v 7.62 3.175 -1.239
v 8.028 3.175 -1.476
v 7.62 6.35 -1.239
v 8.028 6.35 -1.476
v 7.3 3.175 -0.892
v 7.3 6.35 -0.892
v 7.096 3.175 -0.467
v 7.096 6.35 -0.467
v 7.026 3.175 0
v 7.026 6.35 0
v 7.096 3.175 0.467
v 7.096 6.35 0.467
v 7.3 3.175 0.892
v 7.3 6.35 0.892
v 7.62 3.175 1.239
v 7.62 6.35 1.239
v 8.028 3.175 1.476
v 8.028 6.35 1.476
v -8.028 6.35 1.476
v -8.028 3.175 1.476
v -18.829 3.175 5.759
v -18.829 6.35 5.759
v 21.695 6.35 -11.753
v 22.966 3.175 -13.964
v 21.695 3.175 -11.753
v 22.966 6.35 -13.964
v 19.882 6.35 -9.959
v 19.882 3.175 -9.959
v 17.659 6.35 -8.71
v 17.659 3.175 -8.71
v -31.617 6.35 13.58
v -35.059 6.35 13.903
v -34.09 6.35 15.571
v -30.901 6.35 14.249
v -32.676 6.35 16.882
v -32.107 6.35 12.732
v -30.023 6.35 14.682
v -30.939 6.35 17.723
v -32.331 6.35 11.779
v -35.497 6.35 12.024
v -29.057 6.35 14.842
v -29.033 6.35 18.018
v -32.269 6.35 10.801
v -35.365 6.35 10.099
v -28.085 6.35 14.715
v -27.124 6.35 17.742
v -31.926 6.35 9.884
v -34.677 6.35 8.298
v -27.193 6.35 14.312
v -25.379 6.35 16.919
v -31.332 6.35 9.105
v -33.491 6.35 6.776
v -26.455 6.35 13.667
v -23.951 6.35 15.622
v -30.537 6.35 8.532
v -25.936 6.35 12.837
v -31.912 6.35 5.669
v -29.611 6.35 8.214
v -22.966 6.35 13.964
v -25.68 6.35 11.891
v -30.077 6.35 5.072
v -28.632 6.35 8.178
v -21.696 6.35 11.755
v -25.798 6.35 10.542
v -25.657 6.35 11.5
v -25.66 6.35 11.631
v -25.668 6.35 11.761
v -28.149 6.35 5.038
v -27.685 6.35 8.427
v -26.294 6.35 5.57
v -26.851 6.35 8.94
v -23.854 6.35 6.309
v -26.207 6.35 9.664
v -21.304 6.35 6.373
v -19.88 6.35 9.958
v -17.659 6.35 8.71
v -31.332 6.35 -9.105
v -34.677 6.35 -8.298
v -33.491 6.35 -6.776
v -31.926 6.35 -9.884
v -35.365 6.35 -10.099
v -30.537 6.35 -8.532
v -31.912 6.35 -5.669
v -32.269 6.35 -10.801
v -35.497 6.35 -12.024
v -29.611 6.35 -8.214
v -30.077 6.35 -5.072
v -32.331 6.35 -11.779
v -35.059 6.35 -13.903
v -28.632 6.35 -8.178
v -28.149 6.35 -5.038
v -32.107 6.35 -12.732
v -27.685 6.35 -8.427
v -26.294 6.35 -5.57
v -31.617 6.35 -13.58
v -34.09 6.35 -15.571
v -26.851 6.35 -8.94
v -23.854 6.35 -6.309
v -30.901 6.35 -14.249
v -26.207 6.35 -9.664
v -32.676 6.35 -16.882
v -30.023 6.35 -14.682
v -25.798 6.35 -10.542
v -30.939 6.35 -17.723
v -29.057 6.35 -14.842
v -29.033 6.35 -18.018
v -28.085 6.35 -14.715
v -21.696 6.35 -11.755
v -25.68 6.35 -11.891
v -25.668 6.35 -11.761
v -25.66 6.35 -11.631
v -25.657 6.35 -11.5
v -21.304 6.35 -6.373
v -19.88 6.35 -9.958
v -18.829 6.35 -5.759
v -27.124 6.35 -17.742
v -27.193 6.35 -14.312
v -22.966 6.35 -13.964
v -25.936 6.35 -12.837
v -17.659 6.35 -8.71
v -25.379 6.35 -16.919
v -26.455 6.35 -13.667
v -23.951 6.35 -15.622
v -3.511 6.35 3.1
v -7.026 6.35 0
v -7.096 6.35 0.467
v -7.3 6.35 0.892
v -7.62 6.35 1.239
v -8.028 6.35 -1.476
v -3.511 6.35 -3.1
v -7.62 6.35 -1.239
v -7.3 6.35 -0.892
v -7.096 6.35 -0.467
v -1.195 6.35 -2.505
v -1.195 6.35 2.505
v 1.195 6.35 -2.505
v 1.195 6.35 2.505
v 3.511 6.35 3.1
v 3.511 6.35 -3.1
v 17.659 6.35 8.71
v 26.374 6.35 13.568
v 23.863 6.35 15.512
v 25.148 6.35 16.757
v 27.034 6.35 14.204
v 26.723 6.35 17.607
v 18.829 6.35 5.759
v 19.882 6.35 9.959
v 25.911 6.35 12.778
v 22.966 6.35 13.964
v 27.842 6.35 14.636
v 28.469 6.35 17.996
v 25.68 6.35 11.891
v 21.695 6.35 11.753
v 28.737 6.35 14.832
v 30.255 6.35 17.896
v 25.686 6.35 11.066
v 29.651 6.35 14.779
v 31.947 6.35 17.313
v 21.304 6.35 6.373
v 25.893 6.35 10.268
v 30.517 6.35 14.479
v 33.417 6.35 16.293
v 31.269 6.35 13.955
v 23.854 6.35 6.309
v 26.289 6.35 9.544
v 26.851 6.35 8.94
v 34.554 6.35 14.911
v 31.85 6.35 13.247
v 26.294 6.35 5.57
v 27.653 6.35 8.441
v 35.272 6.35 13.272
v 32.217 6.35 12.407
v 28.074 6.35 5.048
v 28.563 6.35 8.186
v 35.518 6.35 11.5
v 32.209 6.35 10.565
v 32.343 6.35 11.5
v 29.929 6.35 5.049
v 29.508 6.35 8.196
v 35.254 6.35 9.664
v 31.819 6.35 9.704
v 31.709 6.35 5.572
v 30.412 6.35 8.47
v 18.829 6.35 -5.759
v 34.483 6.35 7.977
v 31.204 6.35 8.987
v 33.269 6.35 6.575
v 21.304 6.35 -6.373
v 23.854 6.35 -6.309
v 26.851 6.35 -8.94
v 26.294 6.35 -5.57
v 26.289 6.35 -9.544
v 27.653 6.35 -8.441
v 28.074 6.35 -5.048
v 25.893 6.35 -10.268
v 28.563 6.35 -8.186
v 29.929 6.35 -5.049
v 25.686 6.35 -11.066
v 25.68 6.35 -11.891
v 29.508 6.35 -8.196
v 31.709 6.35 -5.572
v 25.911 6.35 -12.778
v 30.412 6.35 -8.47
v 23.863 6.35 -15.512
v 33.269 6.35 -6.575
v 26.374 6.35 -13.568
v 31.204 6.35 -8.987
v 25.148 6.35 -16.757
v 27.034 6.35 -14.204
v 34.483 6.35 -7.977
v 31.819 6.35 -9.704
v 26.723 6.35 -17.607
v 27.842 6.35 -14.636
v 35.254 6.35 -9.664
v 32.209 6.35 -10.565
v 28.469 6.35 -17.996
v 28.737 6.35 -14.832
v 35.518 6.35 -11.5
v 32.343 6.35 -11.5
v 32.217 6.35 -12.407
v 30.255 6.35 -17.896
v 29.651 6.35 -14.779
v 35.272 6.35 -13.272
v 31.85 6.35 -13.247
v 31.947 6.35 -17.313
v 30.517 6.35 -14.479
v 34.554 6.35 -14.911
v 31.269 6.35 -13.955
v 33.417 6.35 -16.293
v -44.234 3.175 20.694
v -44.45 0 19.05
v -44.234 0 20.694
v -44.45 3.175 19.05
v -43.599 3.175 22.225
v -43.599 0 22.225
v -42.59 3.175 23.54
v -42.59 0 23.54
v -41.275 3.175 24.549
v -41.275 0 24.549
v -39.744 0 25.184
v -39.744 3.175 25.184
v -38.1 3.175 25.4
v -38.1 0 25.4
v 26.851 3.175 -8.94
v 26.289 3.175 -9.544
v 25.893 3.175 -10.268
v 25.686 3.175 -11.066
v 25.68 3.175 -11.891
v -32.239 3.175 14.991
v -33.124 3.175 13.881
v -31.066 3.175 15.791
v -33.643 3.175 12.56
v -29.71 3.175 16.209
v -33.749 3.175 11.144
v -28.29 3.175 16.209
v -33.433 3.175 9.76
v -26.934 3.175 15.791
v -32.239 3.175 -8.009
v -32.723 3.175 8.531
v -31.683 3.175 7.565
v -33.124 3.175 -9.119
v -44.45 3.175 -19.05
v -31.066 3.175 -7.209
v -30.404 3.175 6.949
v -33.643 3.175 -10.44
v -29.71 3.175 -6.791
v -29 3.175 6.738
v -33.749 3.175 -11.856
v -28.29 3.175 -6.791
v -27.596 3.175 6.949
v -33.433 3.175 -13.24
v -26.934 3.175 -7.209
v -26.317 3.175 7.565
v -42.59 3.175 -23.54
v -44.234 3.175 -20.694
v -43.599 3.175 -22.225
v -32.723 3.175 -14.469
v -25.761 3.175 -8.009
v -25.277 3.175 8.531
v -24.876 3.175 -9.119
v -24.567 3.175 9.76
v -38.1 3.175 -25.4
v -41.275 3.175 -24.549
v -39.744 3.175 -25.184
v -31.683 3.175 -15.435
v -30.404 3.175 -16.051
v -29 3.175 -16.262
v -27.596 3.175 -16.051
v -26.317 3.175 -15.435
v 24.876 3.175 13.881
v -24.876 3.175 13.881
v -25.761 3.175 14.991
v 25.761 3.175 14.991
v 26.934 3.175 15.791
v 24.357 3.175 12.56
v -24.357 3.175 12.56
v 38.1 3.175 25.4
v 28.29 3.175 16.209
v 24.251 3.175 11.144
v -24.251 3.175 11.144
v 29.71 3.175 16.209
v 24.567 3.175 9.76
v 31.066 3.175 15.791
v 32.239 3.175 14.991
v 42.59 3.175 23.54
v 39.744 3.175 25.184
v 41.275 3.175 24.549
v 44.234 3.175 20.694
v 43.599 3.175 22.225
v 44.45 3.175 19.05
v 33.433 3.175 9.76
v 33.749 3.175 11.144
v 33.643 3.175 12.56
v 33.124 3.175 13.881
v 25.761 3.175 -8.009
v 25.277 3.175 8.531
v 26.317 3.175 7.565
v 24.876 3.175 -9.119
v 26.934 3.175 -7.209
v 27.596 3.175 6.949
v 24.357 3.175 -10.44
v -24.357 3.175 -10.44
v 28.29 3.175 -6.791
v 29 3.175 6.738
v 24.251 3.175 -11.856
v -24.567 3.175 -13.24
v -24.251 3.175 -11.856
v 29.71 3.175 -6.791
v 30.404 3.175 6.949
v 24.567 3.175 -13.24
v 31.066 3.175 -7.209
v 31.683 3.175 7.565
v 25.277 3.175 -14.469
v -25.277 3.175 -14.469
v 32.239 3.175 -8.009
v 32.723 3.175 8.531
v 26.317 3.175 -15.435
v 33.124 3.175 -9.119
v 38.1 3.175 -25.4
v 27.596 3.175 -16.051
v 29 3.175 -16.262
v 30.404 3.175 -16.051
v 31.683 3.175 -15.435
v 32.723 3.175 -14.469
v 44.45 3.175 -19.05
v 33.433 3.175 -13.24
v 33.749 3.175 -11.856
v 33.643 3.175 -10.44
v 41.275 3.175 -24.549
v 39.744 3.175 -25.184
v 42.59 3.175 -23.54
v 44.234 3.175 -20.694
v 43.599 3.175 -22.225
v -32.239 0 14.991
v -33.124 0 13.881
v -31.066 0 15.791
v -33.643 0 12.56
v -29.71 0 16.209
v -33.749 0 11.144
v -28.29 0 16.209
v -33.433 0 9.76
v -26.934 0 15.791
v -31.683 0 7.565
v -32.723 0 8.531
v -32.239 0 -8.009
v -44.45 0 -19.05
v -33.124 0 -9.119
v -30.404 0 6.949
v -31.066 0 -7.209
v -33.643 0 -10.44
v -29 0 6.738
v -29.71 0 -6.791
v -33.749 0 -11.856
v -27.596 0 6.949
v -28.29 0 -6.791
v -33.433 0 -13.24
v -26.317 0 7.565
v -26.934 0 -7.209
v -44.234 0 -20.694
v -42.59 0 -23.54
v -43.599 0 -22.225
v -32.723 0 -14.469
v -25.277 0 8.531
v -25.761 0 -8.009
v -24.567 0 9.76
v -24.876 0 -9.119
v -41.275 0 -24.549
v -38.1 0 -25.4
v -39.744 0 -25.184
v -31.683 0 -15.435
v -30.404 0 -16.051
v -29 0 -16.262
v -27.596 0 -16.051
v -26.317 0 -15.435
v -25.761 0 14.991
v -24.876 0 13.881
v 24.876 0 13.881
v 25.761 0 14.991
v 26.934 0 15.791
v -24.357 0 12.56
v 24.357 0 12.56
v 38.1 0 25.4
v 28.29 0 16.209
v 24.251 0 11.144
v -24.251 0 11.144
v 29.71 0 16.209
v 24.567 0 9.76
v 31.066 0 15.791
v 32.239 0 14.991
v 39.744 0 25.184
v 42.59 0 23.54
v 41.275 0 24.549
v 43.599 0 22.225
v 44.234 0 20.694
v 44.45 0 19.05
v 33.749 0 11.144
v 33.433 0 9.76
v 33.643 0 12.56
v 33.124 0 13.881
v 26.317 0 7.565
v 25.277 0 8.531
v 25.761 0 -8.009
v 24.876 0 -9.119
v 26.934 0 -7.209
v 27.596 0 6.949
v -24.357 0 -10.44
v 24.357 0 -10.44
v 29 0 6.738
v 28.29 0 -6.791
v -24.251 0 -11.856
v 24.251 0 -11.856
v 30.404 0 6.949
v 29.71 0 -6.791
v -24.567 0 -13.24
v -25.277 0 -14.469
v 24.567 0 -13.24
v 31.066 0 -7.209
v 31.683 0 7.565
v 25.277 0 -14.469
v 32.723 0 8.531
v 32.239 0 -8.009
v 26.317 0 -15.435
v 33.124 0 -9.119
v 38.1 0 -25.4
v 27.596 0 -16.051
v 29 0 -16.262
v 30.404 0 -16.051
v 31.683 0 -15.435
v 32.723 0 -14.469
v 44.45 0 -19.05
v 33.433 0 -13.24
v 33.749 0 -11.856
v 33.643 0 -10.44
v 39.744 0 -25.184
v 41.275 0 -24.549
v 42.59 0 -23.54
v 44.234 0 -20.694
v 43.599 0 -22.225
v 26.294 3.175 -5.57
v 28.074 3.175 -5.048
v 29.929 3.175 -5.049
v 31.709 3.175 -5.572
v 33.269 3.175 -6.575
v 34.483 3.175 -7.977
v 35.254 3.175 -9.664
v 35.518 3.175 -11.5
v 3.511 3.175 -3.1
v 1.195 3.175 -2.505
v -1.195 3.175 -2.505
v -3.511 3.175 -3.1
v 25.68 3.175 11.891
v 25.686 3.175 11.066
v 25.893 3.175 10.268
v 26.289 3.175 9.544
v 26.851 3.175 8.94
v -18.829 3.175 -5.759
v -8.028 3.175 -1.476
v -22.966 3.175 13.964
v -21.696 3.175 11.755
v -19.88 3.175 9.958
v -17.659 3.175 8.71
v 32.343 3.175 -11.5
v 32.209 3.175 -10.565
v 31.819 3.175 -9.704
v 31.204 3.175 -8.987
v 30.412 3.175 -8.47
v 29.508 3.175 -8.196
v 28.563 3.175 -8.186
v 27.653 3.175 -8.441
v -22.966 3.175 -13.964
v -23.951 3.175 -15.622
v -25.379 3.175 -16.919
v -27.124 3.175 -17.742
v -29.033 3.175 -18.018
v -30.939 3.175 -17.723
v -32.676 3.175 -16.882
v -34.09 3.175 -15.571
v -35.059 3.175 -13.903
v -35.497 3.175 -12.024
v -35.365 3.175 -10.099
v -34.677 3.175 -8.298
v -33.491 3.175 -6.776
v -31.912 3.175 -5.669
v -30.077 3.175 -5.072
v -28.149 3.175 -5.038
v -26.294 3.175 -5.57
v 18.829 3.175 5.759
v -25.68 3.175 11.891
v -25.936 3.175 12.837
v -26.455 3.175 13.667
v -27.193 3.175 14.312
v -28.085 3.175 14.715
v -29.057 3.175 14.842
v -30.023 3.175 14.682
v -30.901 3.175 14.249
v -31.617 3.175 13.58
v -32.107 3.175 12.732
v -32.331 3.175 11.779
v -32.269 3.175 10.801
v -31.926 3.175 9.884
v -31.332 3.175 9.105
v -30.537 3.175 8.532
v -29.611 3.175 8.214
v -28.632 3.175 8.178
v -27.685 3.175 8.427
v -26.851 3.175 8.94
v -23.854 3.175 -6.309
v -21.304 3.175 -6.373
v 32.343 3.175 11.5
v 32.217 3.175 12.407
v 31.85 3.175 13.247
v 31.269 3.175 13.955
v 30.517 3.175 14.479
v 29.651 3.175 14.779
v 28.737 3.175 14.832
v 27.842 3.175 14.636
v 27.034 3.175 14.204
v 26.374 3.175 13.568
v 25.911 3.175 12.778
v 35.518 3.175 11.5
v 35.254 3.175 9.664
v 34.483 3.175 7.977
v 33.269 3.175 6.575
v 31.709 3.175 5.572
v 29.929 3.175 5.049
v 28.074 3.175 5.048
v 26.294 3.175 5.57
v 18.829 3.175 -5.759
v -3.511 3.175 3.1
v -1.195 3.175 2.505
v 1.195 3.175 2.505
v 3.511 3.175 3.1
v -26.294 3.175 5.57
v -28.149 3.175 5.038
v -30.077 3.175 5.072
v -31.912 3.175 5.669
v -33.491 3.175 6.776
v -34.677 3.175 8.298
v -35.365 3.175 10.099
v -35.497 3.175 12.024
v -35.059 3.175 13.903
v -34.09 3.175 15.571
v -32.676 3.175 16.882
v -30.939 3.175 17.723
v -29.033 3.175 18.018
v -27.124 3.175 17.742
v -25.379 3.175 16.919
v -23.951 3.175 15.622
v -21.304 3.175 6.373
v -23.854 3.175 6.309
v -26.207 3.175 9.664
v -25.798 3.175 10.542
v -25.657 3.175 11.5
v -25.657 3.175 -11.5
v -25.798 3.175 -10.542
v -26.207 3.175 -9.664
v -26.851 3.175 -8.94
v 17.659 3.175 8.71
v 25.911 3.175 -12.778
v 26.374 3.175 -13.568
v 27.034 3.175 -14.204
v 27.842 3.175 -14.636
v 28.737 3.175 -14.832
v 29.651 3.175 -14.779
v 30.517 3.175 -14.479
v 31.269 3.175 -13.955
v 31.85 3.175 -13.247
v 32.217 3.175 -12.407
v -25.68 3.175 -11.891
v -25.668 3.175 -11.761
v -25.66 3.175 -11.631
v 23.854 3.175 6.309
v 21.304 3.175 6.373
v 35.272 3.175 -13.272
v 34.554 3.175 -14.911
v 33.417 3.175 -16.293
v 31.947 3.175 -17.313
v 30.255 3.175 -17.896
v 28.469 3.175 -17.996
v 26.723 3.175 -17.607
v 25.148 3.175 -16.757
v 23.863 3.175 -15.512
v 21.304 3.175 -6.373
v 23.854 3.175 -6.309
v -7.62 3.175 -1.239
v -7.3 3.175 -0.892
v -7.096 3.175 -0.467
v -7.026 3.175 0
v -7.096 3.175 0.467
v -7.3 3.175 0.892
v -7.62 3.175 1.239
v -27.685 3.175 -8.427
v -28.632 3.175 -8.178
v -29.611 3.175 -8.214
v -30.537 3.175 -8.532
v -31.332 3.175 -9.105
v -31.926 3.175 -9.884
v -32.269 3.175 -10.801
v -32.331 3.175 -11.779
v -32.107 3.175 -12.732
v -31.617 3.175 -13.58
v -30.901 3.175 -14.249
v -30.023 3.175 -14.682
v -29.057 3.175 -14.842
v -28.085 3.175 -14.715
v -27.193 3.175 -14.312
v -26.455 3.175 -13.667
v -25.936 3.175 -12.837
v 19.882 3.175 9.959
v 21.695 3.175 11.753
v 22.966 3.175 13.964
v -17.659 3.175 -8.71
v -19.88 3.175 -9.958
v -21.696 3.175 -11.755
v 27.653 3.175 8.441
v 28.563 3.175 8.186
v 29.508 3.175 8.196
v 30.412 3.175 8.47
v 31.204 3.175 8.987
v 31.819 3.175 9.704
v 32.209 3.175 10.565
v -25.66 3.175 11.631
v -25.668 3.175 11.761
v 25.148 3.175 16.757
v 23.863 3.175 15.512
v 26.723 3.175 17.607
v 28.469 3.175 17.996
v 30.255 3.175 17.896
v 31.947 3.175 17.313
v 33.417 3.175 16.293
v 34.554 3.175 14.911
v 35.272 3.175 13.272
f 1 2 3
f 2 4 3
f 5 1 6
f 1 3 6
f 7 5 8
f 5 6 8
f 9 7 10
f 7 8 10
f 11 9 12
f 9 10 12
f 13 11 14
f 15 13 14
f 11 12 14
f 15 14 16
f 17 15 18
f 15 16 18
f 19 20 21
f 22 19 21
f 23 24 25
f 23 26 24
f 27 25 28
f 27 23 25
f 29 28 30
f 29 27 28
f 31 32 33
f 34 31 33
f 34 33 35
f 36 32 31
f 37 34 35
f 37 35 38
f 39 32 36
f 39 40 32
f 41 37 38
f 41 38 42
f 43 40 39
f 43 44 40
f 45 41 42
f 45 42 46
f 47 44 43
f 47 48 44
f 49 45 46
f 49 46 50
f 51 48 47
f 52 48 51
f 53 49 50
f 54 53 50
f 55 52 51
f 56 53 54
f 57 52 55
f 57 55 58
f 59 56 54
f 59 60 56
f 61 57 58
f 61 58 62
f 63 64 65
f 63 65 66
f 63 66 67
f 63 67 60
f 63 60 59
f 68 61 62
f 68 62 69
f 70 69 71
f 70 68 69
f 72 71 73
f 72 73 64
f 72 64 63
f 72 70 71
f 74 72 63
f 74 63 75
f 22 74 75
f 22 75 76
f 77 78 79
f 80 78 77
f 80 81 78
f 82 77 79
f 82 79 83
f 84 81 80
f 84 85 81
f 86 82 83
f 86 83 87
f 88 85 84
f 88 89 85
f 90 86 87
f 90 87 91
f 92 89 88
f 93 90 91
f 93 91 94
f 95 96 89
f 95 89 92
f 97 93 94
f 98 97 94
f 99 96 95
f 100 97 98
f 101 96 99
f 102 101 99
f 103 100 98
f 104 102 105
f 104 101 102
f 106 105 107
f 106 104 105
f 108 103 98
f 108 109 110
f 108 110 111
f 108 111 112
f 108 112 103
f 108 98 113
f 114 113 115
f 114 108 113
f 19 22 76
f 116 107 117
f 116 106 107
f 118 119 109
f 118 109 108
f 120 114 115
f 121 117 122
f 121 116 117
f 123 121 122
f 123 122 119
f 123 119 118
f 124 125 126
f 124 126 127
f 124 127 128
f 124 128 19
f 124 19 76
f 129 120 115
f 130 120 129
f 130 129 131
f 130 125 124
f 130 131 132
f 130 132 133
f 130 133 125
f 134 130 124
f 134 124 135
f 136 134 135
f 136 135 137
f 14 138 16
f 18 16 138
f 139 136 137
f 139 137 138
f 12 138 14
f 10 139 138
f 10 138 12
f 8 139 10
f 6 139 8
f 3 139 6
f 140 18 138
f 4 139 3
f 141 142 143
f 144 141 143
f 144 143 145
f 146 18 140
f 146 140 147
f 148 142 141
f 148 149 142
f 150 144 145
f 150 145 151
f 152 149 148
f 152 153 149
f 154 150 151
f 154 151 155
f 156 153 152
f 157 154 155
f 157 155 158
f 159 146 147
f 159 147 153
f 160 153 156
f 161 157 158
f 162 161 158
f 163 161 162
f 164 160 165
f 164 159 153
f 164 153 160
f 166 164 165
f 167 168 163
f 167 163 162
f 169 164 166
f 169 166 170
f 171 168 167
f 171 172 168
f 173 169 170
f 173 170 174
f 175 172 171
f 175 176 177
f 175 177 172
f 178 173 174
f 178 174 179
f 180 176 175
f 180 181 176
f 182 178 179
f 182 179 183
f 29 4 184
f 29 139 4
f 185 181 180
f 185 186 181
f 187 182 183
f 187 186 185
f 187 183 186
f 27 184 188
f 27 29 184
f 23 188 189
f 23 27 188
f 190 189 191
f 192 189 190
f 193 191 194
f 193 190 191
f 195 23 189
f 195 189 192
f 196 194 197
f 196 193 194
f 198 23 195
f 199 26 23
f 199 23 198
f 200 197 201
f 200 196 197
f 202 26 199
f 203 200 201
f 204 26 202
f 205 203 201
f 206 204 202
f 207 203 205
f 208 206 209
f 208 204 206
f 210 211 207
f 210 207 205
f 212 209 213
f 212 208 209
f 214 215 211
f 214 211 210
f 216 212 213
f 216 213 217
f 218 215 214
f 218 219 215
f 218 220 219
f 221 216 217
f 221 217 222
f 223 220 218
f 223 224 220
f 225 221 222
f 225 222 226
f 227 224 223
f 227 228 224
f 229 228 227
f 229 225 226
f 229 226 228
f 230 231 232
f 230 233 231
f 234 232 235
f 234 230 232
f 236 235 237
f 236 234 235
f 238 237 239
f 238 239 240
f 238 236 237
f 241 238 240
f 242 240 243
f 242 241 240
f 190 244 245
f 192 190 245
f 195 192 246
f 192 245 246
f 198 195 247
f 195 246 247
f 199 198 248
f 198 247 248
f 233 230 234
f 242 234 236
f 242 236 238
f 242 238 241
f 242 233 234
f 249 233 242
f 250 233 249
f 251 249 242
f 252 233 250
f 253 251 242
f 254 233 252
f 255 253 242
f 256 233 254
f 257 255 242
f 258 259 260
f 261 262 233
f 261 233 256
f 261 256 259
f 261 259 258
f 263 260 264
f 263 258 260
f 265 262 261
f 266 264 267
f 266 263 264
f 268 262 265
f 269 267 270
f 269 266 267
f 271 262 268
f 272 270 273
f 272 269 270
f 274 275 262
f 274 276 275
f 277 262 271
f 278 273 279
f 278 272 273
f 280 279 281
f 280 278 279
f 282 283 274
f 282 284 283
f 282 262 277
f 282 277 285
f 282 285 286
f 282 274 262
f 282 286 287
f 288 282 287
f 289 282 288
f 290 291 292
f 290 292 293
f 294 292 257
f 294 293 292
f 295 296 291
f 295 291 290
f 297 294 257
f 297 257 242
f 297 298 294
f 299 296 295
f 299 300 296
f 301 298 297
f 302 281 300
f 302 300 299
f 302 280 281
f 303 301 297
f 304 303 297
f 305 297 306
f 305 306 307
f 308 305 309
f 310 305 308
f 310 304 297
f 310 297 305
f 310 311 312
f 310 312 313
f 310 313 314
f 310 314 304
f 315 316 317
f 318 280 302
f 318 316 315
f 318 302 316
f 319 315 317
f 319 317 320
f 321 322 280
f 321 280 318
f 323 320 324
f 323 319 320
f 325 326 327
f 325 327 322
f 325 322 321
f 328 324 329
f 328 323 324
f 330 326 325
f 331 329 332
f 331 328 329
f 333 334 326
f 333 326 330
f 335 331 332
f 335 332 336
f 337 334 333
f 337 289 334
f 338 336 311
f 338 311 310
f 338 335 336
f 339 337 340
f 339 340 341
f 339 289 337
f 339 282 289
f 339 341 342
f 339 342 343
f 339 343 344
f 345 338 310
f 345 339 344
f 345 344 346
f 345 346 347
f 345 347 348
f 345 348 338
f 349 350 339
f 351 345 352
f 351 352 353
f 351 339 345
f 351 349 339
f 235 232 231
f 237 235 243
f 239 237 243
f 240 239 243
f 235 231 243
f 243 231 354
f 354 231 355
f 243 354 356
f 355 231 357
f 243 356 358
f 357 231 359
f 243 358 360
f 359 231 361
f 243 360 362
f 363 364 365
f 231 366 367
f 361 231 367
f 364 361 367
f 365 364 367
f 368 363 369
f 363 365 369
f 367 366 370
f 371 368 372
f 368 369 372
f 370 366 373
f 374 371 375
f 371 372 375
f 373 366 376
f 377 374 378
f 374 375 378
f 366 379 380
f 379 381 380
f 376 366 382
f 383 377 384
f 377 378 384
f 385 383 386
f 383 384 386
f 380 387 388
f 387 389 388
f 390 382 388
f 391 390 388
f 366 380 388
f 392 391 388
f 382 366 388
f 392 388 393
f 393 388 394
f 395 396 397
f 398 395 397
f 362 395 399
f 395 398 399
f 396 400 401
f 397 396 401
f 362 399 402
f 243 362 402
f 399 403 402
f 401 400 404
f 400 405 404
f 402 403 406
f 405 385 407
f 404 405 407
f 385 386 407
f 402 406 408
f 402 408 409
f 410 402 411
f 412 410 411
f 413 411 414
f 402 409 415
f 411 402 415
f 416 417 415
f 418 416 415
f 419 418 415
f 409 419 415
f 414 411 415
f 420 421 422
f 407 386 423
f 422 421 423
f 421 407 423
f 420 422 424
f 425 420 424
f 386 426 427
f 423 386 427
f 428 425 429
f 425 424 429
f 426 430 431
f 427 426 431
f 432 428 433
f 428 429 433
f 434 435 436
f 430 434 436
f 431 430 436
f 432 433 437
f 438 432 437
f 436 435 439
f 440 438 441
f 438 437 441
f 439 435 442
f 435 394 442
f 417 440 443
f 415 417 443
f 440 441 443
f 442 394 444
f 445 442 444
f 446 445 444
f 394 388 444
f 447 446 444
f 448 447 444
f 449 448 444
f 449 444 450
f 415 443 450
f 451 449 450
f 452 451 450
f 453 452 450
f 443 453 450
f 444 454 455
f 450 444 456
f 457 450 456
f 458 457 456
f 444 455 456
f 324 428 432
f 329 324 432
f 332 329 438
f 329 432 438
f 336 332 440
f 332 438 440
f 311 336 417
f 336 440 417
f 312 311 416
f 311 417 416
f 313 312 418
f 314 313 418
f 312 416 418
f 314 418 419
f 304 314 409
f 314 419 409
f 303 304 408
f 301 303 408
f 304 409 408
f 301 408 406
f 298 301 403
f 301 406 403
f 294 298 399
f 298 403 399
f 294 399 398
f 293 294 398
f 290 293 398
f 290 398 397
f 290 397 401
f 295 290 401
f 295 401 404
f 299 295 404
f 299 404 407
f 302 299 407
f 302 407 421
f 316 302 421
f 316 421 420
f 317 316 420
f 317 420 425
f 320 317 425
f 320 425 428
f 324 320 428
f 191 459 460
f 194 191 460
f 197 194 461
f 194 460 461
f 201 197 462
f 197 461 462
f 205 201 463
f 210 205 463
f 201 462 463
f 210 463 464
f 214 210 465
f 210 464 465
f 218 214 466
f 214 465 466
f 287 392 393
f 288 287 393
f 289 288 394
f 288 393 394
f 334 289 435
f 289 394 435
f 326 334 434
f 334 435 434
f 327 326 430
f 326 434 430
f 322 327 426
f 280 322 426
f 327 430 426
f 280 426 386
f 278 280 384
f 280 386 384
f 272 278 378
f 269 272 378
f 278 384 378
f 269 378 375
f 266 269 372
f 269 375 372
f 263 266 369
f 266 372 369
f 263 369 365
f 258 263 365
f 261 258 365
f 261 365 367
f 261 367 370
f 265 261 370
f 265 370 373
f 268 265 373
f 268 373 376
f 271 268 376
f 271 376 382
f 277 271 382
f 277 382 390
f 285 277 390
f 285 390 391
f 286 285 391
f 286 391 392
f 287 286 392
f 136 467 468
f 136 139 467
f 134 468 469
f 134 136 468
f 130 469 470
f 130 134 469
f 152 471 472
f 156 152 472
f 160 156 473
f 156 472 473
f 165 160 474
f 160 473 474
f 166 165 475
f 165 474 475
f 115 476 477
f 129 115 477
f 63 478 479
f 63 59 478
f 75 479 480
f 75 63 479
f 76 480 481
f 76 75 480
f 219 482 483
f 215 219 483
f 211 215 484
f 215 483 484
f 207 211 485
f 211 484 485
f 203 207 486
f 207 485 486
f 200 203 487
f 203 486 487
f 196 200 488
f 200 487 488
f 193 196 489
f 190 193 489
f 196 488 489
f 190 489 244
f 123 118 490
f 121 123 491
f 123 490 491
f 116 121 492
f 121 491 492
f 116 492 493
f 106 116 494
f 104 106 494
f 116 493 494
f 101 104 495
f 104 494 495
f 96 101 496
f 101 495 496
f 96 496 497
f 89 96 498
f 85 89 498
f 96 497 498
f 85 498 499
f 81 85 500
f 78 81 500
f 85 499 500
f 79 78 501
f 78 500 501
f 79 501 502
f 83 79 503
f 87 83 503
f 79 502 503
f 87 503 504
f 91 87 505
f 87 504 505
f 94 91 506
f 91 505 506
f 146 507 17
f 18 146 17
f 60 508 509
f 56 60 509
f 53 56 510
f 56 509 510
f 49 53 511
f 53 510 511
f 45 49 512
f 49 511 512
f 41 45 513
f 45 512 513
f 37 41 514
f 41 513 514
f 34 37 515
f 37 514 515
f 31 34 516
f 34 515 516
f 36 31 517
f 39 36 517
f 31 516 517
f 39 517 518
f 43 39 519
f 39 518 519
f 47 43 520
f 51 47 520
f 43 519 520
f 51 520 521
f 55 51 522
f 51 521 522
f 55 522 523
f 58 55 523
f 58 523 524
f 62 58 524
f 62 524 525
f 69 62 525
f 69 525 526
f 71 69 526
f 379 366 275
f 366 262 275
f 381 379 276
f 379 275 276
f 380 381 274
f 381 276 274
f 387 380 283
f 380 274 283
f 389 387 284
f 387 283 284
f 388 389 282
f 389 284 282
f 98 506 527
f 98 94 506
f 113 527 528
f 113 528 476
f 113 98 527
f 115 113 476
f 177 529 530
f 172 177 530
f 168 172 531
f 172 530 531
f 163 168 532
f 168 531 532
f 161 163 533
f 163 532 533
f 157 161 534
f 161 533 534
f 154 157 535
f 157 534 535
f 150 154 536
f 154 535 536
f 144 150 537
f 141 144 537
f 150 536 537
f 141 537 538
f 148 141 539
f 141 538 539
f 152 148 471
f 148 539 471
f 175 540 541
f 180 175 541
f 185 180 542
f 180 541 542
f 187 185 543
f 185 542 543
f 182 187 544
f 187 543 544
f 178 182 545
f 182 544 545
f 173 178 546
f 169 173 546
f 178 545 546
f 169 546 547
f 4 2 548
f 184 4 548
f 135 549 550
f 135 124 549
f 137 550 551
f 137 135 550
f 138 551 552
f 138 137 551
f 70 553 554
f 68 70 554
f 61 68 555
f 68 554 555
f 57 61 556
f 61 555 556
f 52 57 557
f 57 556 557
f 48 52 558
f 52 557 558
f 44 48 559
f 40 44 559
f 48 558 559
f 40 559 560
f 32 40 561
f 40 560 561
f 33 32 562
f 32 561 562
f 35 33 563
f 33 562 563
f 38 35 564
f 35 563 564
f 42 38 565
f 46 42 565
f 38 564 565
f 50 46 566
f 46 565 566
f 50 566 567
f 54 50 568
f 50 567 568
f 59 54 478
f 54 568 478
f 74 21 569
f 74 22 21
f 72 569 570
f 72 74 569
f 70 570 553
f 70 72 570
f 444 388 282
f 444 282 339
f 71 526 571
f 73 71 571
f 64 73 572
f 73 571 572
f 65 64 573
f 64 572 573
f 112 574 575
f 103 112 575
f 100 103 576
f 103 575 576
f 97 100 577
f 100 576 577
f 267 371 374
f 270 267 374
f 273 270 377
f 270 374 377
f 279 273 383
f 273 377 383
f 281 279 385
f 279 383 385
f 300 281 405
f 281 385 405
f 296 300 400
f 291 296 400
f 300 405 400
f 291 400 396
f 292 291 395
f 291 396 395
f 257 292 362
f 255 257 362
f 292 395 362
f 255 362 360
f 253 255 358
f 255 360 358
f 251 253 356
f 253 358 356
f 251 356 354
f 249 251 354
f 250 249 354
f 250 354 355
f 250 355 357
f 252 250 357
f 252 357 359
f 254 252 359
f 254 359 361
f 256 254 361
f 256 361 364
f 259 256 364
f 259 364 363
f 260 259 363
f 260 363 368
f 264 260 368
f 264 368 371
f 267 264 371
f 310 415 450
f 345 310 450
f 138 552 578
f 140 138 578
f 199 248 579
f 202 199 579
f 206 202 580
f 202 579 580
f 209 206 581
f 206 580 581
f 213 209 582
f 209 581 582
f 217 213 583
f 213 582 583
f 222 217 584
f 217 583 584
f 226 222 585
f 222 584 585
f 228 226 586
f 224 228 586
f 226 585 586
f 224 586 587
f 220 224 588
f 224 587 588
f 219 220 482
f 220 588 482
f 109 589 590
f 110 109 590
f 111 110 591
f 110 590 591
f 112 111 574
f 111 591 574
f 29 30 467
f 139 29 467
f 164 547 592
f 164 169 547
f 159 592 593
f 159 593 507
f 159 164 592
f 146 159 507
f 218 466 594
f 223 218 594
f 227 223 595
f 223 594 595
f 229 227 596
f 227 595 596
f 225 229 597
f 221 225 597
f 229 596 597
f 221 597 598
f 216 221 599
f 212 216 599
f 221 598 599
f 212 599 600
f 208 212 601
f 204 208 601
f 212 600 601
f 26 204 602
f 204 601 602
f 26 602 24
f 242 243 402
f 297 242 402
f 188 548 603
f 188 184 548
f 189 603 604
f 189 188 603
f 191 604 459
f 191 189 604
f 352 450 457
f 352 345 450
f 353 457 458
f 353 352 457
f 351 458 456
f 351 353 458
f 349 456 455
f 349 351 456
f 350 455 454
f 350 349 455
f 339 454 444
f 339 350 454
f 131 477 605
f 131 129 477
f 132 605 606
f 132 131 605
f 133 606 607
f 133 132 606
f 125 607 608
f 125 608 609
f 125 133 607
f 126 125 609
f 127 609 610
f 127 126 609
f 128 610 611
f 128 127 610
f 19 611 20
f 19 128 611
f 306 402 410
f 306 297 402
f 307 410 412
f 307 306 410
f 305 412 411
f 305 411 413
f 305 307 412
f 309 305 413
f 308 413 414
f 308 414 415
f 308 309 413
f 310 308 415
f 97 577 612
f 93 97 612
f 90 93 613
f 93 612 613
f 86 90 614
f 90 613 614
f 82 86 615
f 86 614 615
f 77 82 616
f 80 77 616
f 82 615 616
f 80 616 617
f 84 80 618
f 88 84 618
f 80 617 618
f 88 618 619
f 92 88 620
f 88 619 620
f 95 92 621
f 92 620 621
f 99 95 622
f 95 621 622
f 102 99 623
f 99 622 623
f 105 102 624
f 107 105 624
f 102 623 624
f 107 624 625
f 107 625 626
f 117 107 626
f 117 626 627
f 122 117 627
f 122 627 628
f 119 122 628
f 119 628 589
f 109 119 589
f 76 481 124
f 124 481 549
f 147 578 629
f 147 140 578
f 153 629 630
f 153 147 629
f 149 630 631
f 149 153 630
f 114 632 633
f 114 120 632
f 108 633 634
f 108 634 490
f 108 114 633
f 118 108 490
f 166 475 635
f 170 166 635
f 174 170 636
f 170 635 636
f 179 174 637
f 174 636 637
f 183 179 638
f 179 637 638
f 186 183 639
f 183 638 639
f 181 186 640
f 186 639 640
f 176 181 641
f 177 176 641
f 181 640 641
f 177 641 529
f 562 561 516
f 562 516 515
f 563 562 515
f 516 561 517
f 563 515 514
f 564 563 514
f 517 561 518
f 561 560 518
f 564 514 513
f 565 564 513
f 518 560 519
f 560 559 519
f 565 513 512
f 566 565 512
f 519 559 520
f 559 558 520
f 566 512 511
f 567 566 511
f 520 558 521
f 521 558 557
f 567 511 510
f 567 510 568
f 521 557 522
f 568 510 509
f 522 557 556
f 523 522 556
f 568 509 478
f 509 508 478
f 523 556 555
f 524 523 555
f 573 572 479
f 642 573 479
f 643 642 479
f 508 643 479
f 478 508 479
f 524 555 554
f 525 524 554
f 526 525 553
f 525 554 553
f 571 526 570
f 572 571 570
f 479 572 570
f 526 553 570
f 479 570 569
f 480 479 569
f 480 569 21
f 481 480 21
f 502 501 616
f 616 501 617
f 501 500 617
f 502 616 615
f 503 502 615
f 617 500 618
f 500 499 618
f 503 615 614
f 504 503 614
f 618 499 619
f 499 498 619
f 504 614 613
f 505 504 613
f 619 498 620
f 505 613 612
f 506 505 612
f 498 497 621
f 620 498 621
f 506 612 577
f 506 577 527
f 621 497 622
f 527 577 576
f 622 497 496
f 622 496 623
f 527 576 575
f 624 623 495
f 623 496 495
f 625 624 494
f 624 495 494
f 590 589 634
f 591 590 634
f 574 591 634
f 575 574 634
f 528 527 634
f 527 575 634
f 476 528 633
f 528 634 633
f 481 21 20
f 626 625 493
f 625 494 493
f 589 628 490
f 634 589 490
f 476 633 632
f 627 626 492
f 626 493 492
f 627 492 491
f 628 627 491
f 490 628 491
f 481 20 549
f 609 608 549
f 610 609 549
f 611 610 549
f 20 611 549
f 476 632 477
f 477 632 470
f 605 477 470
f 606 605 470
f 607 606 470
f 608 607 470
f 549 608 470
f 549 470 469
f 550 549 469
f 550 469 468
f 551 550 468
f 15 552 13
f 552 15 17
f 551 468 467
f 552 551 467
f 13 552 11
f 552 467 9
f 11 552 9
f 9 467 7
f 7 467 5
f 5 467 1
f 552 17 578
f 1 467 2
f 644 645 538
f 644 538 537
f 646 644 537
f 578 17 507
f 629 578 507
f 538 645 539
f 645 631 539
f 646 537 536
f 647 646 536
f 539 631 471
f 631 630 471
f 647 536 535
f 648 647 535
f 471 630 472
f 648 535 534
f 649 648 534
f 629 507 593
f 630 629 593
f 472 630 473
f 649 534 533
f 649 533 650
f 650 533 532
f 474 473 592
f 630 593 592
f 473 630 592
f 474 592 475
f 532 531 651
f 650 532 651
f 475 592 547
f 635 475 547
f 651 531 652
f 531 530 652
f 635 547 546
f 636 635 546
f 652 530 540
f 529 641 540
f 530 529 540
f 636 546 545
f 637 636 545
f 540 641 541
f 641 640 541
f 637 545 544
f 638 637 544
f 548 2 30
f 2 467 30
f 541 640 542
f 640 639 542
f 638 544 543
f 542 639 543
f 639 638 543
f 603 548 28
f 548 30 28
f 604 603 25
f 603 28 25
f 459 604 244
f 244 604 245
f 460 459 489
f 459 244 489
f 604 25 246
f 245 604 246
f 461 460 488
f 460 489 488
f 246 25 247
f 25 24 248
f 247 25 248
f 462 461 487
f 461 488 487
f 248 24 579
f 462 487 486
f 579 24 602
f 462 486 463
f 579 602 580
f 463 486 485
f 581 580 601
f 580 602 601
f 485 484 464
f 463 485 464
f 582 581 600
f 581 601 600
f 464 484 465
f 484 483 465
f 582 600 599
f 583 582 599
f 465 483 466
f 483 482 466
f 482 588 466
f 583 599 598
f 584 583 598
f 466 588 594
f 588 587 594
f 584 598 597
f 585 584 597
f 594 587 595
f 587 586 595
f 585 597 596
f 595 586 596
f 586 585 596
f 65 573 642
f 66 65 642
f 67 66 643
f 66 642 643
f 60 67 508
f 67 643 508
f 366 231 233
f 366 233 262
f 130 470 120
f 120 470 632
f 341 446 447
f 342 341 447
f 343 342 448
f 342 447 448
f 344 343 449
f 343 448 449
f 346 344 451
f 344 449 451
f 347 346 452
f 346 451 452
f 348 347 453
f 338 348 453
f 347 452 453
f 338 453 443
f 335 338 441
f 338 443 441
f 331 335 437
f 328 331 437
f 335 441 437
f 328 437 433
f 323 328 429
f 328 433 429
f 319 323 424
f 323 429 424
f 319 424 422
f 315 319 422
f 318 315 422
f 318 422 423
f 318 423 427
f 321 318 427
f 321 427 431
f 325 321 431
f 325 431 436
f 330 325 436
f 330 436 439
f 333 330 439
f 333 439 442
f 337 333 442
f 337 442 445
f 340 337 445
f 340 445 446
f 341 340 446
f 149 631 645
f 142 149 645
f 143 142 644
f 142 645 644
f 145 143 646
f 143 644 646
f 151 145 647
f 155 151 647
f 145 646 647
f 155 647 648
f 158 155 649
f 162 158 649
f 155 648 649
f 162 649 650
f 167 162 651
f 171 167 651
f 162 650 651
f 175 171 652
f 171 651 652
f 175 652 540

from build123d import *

# Parameters (mm, degrees)
SKETCH1_W               = 88.9
SKETCH1_H               = 50.8
BOSS_EXTRUDE1_DEPTH     = 3.175
BOSS_EXTRUDE3_DEPTH     = 3.175
FILLET1_R               = 9.525
FILLET2_R               = 1.5875
FILLET3_R               = 6.35
CUT_EXTRUDE1_DEPTH      = 52.293694794
CUT_EXTRUDE1_DEPTH_BACK = 52.293694794
SKETCH3_R               = 3.342712029
SKETCH4_R               = 4.7625
CUT_EXTRUDE2_DEPTH      = 52.587643882


with BuildPart() as part:
    # Sketch1 → Boss-Extrude1 (new body)
    with BuildSketch(Plane(origin=(0, 0, 0), x_dir=(1, 0, 0), z_dir=(0, 1, 0))):
        Rectangle(SKETCH1_W, SKETCH1_H)
    extrude(amount=BOSS_EXTRUDE1_DEPTH)

    # Fillet3
    fillet3_edges = [part.edges().sort_by_distance(p)[0] for p in [
        (-44.45, 1.5875, 25.4),
        (-44.45, 1.5875, -25.4),
        (44.45, 1.5875, -25.4),
        (44.45, 1.5875, 25.4),
    ]]
    fillet(fillet3_edges, radius=FILLET3_R)

    # Sketch3 → Cut-Extrude1 (cut, two sides: drawn at the far end of the back side and taken through both)
    with BuildSketch(Plane(origin=(0, 3.175, 0), x_dir=(1, 0, 0), z_dir=(0, 1, 0)).offset(-CUT_EXTRUDE1_DEPTH_BACK)):
        with Locations(Location((-29, 11.5, 0), (0, 0, 270))):
            Circle(SKETCH3_R)
        with Locations(Location((-29, -11.5, 0), (0, 0, 270))):
            Circle(SKETCH3_R)
        with Locations(Location((29, -11.5, 0), (0, 0, 270))):
            Circle(SKETCH3_R)
        with Locations(Location((29, 11.5, 0), (0, 0, 270))):
            Circle(SKETCH3_R)
    extrude(amount=CUT_EXTRUDE1_DEPTH + CUT_EXTRUDE1_DEPTH_BACK, mode=Mode.SUBTRACT)

    # Sketch4 → Cut-Extrude2 (cut, through all)
    with BuildSketch(Plane.XZ):
        with Locations(Location((29, 11.5, 0), (0, 0, 270))):
            Circle(SKETCH4_R)
        with Locations(Location((29, -11.5, 0), (0, 0, 270))):
            Circle(SKETCH4_R)
        with Locations(Location((-29, 11.5, 0), (0, 0, 270))):
            Circle(SKETCH4_R)
        with Locations(Location((-29, -11.5, 0), (0, 0, 270))):
            Circle(SKETCH4_R)
    extrude(amount=-CUT_EXTRUDE2_DEPTH, mode=Mode.SUBTRACT)


with BuildPart() as body_2:
    # Sketch2 → Boss-Extrude3 (new body)
    with BuildSketch(Plane(origin=(0, 3.175, 0), x_dir=(1, 0, 0), z_dir=(0, 1, 0))):
        with BuildLine():
            ThreePointArc((35.517712029, 11.5), (28.571807489, 18.00363139), (22.538549686, 10.645465083))
            Line((22.538549686, 10.645465083), (25.680272317, 11.89132061))
            ThreePointArc((25.680272317, 11.89132061), (29.195997513, 14.836960995), (32.342712029, 11.5))
            ThreePointArc((32.342712029, 11.5), (30.412284607, 8.470284519), (26.850658979, 8.939910767))
            Line((26.850658979, 8.939910767), (23.708936348, 7.69405524))
            ThreePointArc((23.708936348, 7.69405524), (30.99936751, 5.296525196), (35.517712029, 11.5))
        make_face()
        with BuildLine():
            Line((25.680272317, 11.89132061), (22.538549686, 10.645465083))
            ThreePointArc((22.538549686, 10.645465083), (22.941278918, 9.097403709), (23.708936348, 7.69405524))
            Line((23.708936348, 7.69405524), (26.850658979, 8.939910767))
            ThreePointArc((26.850658979, 8.939910767), (25.892688761, 10.267790371), (25.680272317, 11.89132061))
        make_face()
        with BuildLine():
            ThreePointArc((23.708936348, -7.69405524), (22.941278918, -9.097403709), (22.538549686, -10.645465083))
            Line((22.538549686, -10.645465083), (25.680272317, -11.89132061))
            ThreePointArc((25.680272317, -11.89132061), (25.892688761, -10.267790371), (26.850658979, -8.939910767))
            Line((26.850658979, -8.939910767), (23.708936348, -7.69405524))
        make_face()
        with BuildLine():
            Line((25.680272317, -11.89132061), (22.538549686, -10.645465083))
            ThreePointArc((22.538549686, -10.645465083), (28.571807489, -18.00363139), (35.517712029, -11.5))
            ThreePointArc((35.517712029, -11.5), (30.99936751, -5.296525196), (23.708936348, -7.69405524))
            Line((23.708936348, -7.69405524), (26.850658979, -8.939910767))
            ThreePointArc((26.850658979, -8.939910767), (30.412284607, -8.470284519), (32.342712029, -11.5))
            ThreePointArc((32.342712029, -11.5), (29.195997513, -14.836960995), (25.680272317, -11.89132061))
        make_face()
        with BuildLine():
            ThreePointArc((-22.538549686, -10.645465083), (-22.941278918, -9.097403709), (-23.708936348, -7.69405524))
            Line((-23.708936348, -7.69405524), (-26.850658979, -8.939910767))
            ThreePointArc((-26.850658979, -8.939910767), (-25.970284519, -10.087715393), (-25.657287971, -11.5))
            ThreePointArc((-25.657287971, -11.5), (-25.663039005, -11.695997513), (-25.680272317, -11.89132061))
            Line((-25.680272317, -11.89132061), (-22.538549686, -10.645465083))
        make_face()
        with BuildLine():
            Line((-26.850658979, -8.939910767), (-23.708936348, -7.69405524))
            ThreePointArc((-23.708936348, -7.69405524), (-35.203474804, -13.49936751), (-22.482287971, -11.5))
            ThreePointArc((-22.482287971, -11.5), (-22.49636861, -11.071807489), (-22.538549686, -10.645465083))
            Line((-22.538549686, -10.645465083), (-25.680272317, -11.89132061))
            ThreePointArc((-25.680272317, -11.89132061), (-32.107311239, -12.732209629), (-26.850658979, -8.939910767))
        make_face()
        with BuildLine():
            ThreePointArc((-25.657287971, 11.5), (-25.970284519, 10.087715393), (-26.850658979, 8.939910767))
            Line((-26.850658979, 8.939910767), (-23.708936348, 7.69405524))
            ThreePointArc((-23.708936348, 7.69405524), (-22.941278918, 9.097403709), (-22.538549686, 10.645465083))
            Line((-22.538549686, 10.645465083), (-25.680272317, 11.89132061))
            ThreePointArc((-25.680272317, 11.89132061), (-25.663039005, 11.695997513), (-25.657287971, 11.5))
        make_face()
        with BuildLine():
            Line((-23.708936348, 7.69405524), (-26.850658979, 8.939910767))
            ThreePointArc((-26.850658979, 8.939910767), (-32.107311239, 12.732209629), (-25.680272317, 11.89132061))
            Line((-25.680272317, 11.89132061), (-22.538549686, 10.645465083))
            ThreePointArc((-22.538549686, 10.645465083), (-22.49636861, 11.071807489), (-22.482287971, 11.5))
            ThreePointArc((-22.482287971, 11.5), (-35.203474804, 13.49936751), (-23.708936348, 7.69405524))
        make_face()
        with BuildLine():
            ThreePointArc((-22.538549686, 10.645465083), (-22.941278918, 9.097403709), (-23.708936348, 7.69405524))
            Line((-23.708936348, 7.69405524), (-4.306536177, 0))
            Line((-4.306536177, 0), (0, 1.707764346))
            Line((0, 1.707764346), (-22.538549686, 10.645465083))
        make_face()
        with BuildLine():
            Line((0, -1.707764346), (-4.306536177, 0))
            Line((-4.306536177, 0), (-23.708936348, -7.69405524))
            ThreePointArc((-23.708936348, -7.69405524), (-22.941278918, -9.097403709), (-22.538549686, -10.645465083))
            Line((-22.538549686, -10.645465083), (0, -1.707764346))
        make_face()
        with BuildLine():
            Line((22.538549686, 10.645465083), (0, 1.707764346))
            Line((0, 1.707764346), (4.306536177, 0))
            Line((4.306536177, 0), (23.708936348, 7.69405524))
            ThreePointArc((23.708936348, 7.69405524), (22.941278918, 9.097403709), (22.538549686, 10.645465083))
        make_face()
        with BuildLine():
            Line((4.306536177, 0), (0, -1.707764346))
            Line((0, -1.707764346), (22.538549686, -10.645465083))
            ThreePointArc((22.538549686, -10.645465083), (22.941278918, -9.097403709), (23.708936348, -7.69405524))
            Line((23.708936348, -7.69405524), (4.306536177, 0))
        make_face()
        Polygon((0, 1.707764346), (-4.306536177, 0), (0, -1.707764346), (4.306536177, 0), align=None)
    extrude(amount=BOSS_EXTRUDE3_DEPTH)

    # Fillet1
    fillet1_edges = [body_2.edges().sort_by_distance(p)[0] for p in [
        (-23.708936348, 4.7625, 7.69405524),
        (-23.708936348, 4.7625, -7.69405524),
        (-22.538549686, 4.7625, -10.645465083),
        (0, 4.7625, -1.707764346),
        (22.538549686, 4.7625, -10.645465083),
        (23.708936348, 4.7625, -7.69405524),
        (23.708936348, 4.7625, 7.69405524),
        (22.538549686, 4.7625, 10.645465083),
        (0, 4.7625, 1.707764346),
        (-22.538549686, 4.7625, 10.645465083),
    ]]
    fillet(fillet1_edges, radius=FILLET1_R)

    # Fillet2
    fillet2_edges = [body_2.edges().sort_by_distance(p)[0] for p in [
        (-4.306536177, 4.7625, 0),
        (4.306536177, 4.7625, 0),
    ]]
    fillet(fillet2_edges, radius=FILLET2_R)


solid = Compound([part.part, body_2.part])
